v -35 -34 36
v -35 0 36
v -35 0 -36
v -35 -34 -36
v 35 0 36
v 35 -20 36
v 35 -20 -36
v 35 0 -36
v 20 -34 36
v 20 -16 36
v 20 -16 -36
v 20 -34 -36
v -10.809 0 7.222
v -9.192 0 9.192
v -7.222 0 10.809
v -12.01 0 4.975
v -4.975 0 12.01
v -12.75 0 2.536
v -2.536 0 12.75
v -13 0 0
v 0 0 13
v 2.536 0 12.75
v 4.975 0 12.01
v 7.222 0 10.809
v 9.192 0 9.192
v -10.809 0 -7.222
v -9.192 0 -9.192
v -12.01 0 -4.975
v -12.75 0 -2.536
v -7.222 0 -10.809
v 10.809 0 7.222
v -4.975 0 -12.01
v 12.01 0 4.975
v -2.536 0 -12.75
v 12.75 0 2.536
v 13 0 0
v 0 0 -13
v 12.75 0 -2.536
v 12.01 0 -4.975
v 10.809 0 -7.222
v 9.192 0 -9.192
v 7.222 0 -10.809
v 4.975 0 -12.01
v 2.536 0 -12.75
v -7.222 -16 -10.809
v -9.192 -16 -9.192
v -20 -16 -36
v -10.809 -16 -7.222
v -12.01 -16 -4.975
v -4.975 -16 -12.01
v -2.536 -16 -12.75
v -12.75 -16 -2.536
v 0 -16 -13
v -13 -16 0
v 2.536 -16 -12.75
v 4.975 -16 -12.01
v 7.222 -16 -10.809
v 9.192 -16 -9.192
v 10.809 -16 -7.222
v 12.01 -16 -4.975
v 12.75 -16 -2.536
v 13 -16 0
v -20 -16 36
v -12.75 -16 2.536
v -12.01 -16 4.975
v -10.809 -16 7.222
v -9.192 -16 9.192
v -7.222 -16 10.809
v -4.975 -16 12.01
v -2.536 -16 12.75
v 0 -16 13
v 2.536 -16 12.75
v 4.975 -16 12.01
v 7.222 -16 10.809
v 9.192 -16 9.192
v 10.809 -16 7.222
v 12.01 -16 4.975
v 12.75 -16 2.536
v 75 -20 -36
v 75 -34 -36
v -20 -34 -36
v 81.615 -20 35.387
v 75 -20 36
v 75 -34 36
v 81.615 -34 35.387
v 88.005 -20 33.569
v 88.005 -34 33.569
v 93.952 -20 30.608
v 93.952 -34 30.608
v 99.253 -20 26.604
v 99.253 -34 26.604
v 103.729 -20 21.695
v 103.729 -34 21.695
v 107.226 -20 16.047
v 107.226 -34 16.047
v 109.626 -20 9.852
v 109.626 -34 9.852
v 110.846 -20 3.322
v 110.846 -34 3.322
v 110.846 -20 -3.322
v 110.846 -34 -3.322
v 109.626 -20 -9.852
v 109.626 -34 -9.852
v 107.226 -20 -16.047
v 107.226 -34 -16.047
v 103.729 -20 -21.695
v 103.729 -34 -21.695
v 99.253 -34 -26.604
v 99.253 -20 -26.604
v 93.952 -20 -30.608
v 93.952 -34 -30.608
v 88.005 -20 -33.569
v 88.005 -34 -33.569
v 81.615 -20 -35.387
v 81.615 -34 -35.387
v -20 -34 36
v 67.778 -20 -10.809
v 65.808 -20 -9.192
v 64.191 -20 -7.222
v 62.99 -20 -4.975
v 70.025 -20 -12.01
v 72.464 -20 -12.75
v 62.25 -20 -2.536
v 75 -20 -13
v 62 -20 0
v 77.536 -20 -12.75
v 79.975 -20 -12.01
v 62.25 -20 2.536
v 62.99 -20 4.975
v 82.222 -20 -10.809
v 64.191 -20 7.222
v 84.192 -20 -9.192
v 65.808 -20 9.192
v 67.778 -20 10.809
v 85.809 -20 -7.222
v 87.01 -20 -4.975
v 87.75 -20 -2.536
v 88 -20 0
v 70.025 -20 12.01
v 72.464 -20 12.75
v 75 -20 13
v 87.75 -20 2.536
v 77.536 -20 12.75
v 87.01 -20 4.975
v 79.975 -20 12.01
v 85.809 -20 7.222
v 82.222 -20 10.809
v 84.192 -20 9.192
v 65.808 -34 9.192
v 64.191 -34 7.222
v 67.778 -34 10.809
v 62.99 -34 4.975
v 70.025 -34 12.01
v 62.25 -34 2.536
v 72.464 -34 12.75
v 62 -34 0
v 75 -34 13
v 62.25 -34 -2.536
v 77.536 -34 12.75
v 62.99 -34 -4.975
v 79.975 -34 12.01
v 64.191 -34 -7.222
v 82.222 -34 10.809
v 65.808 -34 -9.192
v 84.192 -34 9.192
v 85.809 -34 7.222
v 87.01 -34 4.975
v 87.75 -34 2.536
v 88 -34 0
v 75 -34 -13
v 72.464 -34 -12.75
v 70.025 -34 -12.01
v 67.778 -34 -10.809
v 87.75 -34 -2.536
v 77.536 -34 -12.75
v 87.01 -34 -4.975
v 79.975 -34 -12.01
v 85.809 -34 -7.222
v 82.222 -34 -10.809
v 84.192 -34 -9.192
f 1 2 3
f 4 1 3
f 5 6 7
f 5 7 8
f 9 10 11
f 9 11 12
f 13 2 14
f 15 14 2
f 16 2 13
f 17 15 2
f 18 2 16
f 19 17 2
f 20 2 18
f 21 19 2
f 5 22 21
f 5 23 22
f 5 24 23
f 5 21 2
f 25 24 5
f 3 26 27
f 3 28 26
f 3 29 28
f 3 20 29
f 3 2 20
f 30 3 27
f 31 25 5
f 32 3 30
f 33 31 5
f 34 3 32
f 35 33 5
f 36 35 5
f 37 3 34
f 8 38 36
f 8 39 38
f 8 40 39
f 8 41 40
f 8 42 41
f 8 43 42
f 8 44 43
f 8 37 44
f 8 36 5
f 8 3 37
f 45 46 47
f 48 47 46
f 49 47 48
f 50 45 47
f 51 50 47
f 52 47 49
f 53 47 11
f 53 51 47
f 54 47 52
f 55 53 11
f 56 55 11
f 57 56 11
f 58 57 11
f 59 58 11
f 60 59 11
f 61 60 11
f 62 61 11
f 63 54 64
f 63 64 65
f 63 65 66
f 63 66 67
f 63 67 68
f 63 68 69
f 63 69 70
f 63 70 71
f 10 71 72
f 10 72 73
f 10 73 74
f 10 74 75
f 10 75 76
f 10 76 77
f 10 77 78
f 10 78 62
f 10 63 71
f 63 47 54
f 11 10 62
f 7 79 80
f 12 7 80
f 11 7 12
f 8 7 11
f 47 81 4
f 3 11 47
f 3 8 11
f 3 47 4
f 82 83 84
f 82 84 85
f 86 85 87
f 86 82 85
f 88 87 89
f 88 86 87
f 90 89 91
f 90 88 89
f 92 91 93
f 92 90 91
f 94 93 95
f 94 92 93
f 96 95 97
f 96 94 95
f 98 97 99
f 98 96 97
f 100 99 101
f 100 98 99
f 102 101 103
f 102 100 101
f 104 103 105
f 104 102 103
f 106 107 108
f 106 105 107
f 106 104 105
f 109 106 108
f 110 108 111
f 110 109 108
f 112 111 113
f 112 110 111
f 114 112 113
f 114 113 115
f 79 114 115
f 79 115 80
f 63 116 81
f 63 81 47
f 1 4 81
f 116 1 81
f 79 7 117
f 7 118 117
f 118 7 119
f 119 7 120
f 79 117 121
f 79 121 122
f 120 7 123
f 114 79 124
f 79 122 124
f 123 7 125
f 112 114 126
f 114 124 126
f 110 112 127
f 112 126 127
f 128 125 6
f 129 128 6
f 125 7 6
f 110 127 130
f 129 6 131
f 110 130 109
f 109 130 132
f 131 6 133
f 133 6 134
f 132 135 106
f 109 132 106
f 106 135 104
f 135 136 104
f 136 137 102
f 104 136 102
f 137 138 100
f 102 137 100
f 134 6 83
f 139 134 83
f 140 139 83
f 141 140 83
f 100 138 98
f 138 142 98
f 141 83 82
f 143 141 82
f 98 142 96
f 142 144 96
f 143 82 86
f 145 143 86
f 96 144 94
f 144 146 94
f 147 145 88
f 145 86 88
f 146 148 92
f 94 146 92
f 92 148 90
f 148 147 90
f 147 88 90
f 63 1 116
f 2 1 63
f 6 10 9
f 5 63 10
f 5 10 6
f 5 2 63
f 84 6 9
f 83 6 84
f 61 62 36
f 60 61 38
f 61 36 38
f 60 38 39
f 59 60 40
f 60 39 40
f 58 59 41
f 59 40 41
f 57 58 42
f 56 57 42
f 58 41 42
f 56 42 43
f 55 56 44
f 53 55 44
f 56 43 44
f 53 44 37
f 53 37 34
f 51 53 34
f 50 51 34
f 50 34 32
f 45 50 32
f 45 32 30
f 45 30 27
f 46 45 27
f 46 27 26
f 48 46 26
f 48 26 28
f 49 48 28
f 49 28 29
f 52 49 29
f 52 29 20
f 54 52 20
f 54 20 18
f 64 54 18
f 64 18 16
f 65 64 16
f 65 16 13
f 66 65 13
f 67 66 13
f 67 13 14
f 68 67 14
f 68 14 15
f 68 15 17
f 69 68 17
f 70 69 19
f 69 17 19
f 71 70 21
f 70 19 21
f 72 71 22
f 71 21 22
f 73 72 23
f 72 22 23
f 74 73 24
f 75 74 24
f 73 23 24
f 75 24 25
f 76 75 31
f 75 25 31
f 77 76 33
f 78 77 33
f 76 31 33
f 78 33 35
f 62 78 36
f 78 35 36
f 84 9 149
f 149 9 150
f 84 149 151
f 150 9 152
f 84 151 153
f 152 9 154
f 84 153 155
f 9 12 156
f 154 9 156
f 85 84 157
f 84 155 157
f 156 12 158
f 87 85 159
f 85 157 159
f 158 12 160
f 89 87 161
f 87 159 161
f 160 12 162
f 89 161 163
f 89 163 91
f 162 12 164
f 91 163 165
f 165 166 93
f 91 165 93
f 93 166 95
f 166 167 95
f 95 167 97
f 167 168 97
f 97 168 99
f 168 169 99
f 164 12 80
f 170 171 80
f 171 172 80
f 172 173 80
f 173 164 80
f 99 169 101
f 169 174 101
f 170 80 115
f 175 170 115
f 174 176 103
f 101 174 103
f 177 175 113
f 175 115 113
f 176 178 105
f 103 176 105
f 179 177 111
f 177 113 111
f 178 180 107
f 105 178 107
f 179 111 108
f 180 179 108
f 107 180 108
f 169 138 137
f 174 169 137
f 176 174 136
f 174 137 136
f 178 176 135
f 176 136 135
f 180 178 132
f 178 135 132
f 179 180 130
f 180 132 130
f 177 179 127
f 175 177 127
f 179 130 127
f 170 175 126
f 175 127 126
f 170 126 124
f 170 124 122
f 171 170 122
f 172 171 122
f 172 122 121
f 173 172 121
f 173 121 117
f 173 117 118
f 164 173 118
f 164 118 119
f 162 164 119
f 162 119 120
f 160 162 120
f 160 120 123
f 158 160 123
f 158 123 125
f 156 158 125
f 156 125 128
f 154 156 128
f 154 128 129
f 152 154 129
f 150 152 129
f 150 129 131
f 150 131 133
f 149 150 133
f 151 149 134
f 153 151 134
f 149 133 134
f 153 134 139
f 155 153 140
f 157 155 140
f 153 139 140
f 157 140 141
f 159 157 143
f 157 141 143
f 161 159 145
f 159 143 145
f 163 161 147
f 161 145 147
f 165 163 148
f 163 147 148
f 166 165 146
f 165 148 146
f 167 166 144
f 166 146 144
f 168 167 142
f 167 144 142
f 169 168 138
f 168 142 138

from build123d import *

# Parameters (mm, degrees)
IZIM2_R                     = 13
IZIM2_W                     = 70
IZIM2_H                     = 72
Y_KSEKLIK_EKSTR_ZYON1_DEPTH = 34
IZIM3_OUTSIDE_W             = 181.26
IZIM3_OUTSIDE_H             = 69.26
KES_EKSTR_ZYON4_DEPTH       = 73


with BuildPart() as part:
    # Çizim2 → Yükseklik-Ekstrüzyon1 (new body)
    with BuildSketch(Plane(origin=(0, 0, 0), x_dir=(1, 0, 0), z_dir=(0, 1, 0))):
        with BuildLine():
            Line((35, 36), (35, -36))
            Line((35, -36), (75, -36))
            ThreePointArc((75, -36), (111, 0), (75, 36))
            Line((75, 36), (35, 36))
        make_face()
        with Locations((75, 0)):
            Circle(IZIM2_R, mode=Mode.SUBTRACT)
        Rectangle(IZIM2_W, IZIM2_H)
        Circle(IZIM2_R, mode=Mode.SUBTRACT)
    extrude(amount=-Y_KSEKLIK_EKSTR_ZYON1_DEPTH)

    # Çizim3 outside → Kes-Ekstrüzyon4 (cut, through all)
    with BuildSketch(Plane.XY.offset(36)):
        with Locations((38, -17)):
            Rectangle(IZIM3_OUTSIDE_W, IZIM3_OUTSIDE_H)
        Polygon((-35, 0), (-35, -34), (-20, -34), (-20, -16), (20, -16), (20, -34), (75, -34), (111, -34), (111, -20), (75, -20), (35, -20), (35, 0), align=None, mode=Mode.SUBTRACT)
    extrude(amount=-KES_EKSTR_ZYON4_DEPTH, mode=Mode.SUBTRACT)


solid = part.part
